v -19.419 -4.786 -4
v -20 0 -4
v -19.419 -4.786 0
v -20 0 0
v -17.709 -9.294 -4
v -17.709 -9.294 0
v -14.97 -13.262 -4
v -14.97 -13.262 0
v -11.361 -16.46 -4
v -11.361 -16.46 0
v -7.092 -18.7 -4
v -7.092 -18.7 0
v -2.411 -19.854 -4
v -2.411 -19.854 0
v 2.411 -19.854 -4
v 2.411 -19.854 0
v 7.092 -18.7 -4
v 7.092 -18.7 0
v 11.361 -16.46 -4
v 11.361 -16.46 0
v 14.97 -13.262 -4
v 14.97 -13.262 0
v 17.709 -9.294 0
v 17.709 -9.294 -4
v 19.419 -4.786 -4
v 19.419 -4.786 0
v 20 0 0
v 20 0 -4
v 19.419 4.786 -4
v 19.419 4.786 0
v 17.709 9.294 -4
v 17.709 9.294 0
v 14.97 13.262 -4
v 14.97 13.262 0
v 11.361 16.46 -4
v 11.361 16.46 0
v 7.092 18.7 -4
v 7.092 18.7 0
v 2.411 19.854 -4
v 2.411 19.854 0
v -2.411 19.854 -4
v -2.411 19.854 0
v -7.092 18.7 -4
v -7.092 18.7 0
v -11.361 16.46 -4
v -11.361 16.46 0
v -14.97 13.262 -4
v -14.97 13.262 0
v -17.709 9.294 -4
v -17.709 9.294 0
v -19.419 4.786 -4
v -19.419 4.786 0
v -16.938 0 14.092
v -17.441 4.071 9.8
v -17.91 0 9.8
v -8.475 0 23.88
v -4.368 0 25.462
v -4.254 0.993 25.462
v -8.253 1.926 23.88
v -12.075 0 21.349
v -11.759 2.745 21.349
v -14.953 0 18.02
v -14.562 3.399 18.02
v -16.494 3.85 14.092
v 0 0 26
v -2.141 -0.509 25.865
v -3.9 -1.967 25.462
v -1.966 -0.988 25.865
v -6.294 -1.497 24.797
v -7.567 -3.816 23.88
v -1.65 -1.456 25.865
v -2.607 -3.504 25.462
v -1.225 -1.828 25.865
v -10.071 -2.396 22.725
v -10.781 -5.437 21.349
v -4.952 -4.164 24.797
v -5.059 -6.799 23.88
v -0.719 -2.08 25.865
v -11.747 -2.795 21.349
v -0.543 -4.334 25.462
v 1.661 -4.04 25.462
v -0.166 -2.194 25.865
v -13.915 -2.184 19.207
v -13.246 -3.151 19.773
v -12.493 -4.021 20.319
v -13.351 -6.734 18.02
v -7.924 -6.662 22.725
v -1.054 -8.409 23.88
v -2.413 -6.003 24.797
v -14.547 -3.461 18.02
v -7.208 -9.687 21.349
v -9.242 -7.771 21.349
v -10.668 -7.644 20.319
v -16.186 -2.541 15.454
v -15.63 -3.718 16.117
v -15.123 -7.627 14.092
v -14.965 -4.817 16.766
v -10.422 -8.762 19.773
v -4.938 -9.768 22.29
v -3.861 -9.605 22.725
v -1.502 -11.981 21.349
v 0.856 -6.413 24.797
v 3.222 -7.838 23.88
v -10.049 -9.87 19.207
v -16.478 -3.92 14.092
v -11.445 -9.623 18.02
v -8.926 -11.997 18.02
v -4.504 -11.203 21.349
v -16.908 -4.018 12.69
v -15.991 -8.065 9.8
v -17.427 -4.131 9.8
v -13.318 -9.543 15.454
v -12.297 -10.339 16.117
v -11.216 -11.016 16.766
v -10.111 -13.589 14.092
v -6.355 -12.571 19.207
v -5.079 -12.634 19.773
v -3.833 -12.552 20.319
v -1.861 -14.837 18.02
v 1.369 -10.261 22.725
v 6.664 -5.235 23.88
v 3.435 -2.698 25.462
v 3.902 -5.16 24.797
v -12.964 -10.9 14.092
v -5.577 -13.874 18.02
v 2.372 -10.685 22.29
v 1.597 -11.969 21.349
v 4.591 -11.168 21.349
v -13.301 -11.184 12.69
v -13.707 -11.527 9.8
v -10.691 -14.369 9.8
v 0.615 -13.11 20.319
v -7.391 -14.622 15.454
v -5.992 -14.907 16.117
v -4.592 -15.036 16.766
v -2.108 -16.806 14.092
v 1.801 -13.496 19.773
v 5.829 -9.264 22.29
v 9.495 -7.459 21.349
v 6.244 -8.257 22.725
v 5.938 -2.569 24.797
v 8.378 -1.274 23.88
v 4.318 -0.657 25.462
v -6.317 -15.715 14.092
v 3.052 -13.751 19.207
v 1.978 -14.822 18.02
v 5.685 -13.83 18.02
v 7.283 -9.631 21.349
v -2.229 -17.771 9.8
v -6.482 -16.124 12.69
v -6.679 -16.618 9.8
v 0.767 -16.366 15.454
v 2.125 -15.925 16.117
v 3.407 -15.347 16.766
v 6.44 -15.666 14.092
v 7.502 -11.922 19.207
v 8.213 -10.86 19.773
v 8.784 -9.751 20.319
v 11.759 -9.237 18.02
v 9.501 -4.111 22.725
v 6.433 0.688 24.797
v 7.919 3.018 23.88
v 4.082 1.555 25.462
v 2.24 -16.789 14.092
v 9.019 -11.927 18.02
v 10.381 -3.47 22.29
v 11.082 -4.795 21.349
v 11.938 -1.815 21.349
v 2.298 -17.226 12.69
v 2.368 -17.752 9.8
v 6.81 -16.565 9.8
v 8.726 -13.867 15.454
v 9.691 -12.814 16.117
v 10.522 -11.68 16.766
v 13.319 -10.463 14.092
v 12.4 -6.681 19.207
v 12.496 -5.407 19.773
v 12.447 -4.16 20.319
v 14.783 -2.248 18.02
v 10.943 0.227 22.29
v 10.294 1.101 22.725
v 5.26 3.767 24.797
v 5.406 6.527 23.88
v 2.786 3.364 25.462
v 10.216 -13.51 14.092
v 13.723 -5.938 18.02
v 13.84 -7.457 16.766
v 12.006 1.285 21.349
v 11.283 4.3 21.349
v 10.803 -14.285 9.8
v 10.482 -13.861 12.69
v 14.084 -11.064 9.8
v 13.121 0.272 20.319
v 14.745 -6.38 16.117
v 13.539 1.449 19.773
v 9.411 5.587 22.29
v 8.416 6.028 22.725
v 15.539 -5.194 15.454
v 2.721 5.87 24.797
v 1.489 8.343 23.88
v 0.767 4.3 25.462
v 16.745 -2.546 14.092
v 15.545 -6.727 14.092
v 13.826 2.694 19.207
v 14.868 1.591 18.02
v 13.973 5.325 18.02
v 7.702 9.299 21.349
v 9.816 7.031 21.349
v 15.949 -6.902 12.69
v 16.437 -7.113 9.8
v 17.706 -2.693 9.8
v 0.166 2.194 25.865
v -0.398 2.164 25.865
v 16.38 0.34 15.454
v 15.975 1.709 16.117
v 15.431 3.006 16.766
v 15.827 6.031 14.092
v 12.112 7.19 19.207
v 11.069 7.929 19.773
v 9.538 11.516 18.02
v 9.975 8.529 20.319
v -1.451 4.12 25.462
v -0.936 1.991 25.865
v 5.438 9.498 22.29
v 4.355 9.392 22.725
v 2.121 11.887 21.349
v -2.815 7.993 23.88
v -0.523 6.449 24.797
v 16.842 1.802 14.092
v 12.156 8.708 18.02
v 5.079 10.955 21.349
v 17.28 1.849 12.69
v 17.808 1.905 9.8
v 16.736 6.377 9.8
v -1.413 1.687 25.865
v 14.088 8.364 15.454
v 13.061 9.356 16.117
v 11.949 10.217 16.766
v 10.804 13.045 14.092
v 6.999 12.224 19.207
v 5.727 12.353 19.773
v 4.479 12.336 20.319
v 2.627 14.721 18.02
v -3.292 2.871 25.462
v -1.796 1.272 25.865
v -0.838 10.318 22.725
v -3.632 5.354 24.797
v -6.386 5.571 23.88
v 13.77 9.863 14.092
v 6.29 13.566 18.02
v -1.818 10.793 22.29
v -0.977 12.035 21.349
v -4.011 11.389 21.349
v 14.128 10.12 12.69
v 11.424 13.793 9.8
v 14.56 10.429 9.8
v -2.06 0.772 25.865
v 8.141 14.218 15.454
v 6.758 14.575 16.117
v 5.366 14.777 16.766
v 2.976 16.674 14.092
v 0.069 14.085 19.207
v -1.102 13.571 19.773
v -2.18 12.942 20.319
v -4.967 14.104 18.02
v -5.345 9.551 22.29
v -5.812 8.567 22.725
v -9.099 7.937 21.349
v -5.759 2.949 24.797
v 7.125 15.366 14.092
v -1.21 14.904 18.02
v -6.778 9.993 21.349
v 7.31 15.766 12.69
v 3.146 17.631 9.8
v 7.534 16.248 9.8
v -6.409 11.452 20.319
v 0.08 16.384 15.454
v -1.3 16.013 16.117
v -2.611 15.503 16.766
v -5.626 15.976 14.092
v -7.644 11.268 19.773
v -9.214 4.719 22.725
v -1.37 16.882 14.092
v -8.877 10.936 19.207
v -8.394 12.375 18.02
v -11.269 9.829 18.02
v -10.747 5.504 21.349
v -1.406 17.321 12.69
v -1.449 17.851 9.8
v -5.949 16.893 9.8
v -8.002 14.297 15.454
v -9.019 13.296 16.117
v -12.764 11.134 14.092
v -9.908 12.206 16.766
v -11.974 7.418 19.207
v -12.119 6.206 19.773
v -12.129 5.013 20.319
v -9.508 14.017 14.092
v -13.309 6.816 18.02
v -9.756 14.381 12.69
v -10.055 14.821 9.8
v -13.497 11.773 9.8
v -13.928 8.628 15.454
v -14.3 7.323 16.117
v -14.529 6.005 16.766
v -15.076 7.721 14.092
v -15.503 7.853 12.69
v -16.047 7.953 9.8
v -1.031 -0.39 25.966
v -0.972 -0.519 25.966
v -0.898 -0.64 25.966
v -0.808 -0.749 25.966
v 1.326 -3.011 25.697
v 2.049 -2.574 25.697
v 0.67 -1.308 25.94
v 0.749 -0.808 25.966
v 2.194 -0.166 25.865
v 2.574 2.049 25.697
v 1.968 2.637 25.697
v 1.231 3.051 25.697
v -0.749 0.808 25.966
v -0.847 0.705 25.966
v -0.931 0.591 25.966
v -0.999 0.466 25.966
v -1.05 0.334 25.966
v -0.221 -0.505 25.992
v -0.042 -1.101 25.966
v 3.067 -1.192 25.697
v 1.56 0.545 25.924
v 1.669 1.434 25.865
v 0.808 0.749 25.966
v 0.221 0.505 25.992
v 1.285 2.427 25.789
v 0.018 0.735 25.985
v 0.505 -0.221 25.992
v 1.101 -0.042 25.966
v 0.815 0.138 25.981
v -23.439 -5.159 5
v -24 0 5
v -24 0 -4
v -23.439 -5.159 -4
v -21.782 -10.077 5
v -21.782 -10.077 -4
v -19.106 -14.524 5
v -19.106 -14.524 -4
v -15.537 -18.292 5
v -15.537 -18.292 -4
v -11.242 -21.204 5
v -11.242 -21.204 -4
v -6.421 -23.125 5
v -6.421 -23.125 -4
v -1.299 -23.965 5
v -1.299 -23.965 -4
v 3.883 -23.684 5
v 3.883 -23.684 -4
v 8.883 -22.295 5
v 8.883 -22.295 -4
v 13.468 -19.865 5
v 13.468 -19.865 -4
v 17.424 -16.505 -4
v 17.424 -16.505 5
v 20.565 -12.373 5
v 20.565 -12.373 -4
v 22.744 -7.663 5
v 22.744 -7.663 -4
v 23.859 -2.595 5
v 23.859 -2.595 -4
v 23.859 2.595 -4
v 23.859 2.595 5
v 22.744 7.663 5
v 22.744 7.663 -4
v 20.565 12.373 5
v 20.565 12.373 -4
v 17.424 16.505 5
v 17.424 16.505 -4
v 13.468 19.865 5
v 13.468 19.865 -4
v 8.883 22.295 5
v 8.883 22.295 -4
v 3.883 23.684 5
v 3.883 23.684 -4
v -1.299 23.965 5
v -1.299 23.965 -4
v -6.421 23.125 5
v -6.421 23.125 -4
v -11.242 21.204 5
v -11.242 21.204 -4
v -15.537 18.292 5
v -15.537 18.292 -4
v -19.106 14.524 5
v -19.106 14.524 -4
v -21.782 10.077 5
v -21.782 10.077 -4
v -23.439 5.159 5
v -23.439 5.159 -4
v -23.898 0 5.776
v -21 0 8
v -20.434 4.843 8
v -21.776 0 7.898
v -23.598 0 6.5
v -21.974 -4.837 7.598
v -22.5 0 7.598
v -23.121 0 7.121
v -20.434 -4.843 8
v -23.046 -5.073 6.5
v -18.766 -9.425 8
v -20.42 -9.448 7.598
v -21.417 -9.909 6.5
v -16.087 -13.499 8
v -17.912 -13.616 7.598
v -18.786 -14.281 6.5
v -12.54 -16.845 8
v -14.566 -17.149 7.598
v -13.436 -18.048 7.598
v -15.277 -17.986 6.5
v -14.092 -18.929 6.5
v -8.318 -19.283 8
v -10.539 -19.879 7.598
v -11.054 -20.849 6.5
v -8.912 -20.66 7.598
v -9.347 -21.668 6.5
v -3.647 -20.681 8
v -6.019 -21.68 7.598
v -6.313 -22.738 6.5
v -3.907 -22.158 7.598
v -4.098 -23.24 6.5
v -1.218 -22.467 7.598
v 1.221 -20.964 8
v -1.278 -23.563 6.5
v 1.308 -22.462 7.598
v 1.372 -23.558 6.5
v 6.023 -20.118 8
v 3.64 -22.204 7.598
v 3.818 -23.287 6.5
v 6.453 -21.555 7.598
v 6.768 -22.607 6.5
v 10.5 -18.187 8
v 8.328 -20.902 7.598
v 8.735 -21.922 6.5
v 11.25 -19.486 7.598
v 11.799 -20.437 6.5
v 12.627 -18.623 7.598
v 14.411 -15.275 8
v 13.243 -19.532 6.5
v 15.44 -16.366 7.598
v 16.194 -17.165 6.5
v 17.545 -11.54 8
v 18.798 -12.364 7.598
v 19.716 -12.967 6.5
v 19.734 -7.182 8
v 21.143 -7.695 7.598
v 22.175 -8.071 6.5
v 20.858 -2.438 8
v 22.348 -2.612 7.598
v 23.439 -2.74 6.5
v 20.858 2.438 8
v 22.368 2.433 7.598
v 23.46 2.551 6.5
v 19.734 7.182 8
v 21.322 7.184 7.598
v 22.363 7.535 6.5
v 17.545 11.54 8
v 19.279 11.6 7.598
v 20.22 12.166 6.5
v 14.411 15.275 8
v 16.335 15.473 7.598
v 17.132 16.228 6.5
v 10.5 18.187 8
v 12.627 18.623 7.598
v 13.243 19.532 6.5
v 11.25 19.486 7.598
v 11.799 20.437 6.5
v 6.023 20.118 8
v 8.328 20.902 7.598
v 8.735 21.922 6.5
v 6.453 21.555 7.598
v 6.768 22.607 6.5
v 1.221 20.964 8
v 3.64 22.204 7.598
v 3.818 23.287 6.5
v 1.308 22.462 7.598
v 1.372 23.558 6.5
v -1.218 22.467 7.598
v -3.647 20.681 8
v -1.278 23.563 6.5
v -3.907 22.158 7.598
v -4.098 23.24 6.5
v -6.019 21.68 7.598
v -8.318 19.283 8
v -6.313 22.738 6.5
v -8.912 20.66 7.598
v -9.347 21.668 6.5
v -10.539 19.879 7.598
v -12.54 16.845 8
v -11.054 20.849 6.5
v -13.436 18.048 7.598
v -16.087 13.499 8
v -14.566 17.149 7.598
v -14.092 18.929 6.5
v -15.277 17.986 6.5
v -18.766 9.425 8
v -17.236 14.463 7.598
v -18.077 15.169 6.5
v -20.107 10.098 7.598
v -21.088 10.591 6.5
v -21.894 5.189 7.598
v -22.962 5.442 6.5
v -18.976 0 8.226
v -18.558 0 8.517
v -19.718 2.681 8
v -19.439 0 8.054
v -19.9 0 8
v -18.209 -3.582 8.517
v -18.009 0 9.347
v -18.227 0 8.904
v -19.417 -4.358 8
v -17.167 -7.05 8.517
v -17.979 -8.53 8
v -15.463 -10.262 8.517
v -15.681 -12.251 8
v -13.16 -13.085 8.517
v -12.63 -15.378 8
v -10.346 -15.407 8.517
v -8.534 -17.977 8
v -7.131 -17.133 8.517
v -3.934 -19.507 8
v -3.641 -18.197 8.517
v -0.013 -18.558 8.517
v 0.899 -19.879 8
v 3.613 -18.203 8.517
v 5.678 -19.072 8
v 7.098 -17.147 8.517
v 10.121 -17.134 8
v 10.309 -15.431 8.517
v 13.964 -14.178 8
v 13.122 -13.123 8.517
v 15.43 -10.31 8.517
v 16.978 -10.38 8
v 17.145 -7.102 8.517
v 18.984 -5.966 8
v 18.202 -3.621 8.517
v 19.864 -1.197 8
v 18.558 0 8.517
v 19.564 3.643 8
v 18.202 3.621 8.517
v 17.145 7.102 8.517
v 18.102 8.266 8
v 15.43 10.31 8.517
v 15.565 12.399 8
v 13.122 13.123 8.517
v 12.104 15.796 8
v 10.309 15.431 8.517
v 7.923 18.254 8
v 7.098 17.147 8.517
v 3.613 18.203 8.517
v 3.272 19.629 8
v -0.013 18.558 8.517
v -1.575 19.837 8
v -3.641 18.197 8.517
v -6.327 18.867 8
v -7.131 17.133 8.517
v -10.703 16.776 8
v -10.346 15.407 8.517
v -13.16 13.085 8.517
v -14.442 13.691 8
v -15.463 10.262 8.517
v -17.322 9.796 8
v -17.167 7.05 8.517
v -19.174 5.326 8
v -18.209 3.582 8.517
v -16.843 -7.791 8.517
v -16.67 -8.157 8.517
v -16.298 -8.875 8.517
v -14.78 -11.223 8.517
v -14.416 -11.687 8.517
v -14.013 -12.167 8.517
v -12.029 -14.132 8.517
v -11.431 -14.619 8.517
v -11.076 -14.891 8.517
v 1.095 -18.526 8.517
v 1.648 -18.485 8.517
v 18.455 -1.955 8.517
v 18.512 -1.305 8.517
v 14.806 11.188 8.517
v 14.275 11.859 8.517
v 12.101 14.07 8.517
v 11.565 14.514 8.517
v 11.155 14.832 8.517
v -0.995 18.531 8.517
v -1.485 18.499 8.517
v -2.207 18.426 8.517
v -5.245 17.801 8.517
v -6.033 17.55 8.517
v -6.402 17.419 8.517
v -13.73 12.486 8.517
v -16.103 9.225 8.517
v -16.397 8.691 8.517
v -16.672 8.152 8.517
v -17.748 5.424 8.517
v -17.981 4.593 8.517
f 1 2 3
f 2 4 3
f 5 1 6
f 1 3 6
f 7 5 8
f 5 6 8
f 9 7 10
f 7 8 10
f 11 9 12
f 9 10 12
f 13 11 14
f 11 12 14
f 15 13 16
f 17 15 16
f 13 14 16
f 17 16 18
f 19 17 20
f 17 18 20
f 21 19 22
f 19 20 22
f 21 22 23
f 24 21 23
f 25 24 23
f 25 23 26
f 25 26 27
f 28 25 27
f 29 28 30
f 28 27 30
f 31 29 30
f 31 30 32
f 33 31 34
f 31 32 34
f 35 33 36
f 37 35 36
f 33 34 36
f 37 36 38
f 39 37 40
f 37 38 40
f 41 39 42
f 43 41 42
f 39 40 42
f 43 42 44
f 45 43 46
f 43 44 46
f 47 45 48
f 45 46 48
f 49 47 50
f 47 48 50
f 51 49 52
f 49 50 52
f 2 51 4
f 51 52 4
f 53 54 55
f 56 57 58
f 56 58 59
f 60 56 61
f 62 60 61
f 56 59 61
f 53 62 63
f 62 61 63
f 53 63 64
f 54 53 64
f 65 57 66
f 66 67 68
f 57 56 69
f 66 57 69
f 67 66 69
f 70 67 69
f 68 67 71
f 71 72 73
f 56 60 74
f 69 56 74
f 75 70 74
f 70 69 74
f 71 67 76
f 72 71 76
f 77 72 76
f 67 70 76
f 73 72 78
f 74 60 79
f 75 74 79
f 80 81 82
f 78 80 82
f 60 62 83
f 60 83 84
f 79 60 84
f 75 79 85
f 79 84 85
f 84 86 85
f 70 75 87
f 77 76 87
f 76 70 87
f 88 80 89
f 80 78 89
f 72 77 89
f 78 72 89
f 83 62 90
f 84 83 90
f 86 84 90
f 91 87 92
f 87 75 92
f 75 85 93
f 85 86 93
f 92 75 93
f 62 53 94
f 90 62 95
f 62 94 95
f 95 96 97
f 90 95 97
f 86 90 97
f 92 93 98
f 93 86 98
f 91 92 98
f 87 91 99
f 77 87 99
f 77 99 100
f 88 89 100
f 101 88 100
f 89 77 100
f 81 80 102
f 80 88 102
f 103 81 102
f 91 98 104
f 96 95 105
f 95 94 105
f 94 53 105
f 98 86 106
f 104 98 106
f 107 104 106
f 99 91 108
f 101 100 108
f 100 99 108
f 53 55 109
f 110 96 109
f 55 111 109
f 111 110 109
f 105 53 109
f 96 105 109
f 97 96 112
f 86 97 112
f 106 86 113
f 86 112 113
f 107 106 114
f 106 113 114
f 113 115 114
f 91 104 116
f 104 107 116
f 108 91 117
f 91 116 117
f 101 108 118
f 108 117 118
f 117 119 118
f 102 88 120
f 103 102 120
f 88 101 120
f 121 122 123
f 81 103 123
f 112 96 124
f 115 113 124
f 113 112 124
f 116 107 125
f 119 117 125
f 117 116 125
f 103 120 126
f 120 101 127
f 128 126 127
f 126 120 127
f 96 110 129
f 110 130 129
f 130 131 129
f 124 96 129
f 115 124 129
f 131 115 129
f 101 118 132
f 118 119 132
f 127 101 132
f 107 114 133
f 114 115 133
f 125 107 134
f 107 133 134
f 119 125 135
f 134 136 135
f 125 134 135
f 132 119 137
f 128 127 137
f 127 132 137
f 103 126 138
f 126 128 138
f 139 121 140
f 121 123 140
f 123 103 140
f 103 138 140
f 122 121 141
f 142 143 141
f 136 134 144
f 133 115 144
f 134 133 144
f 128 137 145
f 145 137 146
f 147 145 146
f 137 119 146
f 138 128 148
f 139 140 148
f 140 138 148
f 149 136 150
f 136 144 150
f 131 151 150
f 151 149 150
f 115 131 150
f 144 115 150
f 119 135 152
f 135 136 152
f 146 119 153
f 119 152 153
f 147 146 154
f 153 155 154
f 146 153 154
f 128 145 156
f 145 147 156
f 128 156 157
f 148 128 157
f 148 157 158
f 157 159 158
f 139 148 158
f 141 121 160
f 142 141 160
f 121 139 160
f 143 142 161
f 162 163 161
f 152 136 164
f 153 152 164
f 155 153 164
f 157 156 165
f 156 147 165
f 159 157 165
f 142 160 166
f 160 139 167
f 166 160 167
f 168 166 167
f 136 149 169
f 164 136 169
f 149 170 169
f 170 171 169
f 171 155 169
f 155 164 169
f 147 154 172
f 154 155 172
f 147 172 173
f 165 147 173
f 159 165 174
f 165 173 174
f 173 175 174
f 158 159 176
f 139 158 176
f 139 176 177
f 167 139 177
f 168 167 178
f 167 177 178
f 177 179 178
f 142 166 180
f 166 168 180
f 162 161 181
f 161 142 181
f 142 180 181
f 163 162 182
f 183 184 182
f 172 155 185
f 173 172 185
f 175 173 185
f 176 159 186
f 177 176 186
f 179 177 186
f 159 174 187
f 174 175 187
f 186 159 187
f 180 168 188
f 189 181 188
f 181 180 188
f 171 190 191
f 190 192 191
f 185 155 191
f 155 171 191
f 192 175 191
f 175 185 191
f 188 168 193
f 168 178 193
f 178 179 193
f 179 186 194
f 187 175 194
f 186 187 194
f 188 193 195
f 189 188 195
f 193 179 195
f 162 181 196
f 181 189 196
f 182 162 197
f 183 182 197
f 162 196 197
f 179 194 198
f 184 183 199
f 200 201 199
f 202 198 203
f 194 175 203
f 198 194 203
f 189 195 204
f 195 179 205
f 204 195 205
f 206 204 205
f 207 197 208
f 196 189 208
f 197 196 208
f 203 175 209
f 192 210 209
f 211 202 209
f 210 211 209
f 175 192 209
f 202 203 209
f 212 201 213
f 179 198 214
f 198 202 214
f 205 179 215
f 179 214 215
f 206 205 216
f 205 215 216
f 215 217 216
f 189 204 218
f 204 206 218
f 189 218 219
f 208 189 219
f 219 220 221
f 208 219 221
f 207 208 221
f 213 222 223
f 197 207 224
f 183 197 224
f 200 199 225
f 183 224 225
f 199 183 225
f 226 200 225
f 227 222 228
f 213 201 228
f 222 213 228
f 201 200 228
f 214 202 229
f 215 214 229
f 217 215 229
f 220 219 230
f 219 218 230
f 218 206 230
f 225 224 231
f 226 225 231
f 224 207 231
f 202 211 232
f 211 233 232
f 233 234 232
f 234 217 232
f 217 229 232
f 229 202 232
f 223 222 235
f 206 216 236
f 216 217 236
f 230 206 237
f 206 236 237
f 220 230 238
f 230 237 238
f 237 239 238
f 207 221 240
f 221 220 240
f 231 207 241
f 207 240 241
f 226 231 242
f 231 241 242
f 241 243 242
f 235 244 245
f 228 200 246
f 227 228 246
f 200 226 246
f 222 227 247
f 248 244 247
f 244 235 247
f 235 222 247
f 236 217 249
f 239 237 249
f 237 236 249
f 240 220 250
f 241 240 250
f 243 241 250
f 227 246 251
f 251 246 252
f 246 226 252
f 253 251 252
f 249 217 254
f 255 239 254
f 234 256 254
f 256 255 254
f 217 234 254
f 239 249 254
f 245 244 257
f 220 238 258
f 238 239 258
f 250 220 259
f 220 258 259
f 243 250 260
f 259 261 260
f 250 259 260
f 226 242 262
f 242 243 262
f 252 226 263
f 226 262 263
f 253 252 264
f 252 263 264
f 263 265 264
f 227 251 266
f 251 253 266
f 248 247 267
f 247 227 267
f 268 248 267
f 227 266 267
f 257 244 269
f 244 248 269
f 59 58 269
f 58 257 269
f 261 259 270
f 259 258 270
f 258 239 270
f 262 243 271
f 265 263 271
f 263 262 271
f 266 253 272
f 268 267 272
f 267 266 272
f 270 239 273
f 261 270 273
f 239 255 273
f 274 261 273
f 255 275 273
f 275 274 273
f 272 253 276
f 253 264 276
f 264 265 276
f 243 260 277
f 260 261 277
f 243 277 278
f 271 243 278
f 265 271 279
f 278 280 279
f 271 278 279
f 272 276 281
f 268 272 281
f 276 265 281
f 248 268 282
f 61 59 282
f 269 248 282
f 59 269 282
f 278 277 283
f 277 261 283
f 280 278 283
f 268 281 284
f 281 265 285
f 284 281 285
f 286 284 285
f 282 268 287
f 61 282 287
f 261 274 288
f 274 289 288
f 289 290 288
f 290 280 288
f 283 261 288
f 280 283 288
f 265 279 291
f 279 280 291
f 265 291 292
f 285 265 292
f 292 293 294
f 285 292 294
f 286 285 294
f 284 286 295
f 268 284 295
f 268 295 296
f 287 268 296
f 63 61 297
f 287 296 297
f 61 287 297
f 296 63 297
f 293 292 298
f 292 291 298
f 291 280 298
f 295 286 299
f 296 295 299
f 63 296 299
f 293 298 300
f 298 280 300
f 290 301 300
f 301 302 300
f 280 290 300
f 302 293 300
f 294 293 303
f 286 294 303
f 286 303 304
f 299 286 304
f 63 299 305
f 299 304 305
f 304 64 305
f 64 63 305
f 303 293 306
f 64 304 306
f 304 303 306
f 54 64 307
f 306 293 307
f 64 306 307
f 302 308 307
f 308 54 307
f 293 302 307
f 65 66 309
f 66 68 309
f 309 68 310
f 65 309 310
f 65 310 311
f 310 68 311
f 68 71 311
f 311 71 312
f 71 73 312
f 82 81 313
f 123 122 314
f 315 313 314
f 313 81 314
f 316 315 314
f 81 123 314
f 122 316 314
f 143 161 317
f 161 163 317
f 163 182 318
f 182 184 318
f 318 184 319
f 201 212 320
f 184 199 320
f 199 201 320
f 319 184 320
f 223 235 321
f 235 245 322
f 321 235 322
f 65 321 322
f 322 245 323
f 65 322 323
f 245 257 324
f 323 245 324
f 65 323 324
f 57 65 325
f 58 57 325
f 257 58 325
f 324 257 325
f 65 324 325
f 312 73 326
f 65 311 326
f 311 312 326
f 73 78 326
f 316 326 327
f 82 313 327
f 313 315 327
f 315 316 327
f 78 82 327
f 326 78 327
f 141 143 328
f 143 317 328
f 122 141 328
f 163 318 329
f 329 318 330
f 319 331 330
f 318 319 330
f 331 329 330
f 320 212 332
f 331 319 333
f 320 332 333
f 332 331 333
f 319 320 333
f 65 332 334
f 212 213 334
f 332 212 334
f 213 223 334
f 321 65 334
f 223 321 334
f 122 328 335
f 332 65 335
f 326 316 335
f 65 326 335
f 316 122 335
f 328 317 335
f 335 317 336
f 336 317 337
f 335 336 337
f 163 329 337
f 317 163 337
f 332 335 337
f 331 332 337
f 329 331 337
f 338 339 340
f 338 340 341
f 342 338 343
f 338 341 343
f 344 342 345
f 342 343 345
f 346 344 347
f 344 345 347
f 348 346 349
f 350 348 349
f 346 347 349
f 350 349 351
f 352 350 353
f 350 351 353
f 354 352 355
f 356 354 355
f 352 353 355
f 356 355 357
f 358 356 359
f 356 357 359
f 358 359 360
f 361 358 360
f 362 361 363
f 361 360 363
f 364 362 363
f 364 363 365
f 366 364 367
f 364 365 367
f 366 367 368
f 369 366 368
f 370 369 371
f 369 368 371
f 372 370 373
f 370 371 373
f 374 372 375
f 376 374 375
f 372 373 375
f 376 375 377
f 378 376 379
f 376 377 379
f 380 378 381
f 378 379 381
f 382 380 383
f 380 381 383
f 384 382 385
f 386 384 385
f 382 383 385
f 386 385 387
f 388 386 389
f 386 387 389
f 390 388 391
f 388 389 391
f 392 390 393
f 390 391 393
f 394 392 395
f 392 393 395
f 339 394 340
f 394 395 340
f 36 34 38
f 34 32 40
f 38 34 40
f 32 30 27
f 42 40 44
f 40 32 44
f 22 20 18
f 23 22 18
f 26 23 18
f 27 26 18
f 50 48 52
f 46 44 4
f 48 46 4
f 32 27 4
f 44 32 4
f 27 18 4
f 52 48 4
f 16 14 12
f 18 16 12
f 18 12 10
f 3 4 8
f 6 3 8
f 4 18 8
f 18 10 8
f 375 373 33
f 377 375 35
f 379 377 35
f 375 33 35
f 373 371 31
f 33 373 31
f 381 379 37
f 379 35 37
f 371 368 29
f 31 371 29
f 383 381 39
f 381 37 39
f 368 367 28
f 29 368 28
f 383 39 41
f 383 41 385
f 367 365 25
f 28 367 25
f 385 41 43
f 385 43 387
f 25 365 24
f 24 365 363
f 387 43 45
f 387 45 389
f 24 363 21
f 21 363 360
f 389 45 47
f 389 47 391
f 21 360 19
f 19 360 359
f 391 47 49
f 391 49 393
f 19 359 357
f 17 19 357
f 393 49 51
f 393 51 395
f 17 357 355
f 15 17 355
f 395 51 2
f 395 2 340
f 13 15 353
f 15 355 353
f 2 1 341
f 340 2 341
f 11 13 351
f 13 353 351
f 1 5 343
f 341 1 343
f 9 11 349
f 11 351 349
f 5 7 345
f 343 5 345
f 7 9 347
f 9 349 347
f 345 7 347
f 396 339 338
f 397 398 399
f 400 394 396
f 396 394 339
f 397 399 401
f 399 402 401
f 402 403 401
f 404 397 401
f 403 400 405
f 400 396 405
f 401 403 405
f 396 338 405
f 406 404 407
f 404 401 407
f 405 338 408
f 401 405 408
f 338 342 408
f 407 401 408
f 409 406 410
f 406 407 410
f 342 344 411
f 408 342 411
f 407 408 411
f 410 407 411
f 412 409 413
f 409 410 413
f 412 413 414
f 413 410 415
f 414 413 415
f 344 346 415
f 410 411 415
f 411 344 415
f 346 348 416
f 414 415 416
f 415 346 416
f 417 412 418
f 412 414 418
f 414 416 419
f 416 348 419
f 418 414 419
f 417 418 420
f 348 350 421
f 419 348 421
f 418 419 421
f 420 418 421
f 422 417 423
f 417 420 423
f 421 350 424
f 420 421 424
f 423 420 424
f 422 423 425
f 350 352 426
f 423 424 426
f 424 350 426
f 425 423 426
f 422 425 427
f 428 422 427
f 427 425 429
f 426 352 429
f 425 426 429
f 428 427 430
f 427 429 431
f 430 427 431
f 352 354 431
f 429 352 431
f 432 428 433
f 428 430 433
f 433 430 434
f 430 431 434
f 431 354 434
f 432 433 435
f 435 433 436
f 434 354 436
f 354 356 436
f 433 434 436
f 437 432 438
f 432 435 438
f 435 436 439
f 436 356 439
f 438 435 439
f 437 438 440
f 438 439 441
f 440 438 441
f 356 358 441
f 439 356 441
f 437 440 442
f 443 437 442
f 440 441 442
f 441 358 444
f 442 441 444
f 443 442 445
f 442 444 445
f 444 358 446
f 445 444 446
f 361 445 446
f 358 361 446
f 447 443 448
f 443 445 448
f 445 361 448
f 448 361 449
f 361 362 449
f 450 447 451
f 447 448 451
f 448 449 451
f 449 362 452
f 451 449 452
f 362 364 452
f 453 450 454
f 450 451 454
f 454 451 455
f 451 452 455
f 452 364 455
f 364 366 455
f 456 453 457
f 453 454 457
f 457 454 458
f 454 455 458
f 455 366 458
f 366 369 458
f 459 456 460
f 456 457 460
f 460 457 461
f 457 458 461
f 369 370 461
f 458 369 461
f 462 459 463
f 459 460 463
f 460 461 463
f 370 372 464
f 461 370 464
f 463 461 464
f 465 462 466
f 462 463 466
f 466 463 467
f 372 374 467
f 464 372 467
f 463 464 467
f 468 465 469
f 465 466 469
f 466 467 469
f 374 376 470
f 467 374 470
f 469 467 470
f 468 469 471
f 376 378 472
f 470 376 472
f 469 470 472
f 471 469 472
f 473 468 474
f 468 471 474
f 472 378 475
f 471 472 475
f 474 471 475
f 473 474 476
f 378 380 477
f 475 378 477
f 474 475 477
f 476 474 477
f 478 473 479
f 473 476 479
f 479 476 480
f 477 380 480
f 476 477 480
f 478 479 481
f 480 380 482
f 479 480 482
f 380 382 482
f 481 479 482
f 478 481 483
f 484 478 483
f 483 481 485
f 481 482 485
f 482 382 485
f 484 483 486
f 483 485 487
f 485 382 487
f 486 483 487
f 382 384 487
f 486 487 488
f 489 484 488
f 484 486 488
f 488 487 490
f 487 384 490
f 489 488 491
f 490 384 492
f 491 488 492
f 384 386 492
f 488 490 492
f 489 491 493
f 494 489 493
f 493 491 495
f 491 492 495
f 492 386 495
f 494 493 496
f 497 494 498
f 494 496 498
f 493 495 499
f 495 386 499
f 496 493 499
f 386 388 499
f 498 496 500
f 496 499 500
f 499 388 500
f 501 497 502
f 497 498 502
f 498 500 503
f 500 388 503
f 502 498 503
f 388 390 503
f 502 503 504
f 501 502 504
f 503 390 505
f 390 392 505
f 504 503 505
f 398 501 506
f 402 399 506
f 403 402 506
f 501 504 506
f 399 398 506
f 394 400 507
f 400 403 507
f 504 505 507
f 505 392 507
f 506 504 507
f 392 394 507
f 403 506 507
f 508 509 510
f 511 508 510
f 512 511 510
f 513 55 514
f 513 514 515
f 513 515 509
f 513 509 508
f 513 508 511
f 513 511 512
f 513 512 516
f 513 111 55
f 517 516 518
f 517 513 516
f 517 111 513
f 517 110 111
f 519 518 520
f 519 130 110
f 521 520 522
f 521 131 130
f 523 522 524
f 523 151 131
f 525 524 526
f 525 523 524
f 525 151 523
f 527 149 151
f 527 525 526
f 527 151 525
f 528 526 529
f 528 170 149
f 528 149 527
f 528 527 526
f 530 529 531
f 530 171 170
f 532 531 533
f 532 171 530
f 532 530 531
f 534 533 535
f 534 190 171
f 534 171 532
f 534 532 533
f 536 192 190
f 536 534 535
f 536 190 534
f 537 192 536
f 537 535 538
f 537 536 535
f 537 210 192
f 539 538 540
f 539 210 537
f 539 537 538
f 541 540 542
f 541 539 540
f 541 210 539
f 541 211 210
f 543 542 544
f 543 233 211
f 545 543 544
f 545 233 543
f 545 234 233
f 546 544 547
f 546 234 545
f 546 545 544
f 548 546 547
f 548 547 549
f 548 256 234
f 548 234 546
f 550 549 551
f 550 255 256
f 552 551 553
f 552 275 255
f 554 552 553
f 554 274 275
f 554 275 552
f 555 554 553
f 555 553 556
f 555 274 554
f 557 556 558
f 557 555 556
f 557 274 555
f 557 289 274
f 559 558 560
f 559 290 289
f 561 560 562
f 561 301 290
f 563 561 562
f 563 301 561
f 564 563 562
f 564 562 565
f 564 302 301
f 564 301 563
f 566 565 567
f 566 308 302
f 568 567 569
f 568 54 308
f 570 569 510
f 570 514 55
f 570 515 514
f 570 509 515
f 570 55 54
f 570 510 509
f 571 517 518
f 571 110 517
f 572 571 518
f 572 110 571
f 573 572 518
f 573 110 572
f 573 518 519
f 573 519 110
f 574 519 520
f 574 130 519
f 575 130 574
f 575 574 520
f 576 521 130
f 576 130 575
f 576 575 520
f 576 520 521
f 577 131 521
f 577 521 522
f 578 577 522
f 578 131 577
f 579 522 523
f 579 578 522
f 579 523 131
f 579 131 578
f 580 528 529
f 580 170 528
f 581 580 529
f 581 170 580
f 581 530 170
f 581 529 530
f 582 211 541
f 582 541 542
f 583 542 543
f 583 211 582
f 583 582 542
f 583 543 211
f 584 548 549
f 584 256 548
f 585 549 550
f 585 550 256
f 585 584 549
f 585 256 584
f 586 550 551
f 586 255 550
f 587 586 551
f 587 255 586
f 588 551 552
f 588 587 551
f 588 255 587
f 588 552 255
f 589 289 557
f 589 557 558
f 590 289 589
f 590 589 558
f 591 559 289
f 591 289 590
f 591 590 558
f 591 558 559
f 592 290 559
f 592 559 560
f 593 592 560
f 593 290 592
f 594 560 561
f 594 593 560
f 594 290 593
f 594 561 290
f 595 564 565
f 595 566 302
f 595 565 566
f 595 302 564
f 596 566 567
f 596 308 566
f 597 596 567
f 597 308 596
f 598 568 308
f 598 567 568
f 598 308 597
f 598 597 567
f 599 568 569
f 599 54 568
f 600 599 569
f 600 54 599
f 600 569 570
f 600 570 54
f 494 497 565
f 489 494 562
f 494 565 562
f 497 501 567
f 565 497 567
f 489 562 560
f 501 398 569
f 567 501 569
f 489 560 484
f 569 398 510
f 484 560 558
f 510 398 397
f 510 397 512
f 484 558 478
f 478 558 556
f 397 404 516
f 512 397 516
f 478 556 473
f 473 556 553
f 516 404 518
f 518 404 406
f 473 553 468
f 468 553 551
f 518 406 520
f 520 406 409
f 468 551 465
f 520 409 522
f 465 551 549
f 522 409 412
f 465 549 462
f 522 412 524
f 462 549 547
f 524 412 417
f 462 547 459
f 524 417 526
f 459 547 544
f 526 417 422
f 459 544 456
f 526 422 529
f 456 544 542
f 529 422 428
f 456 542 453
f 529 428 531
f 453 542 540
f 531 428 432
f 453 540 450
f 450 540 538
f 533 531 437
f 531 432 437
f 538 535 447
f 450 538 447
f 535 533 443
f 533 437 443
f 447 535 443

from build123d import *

# Parameters (mm, degrees)
F2_R = 2
F3_R = 3


with BuildPart() as f1:
    # F0 (on Front) → F1 (revolve)
    with BuildSketch(Plane.XZ):
        with BuildLine():
            Line((-20, 0), (0, 0))
            Line((0, 0), (0, 8))
            Line((0, 8), (0, 26))
            ThreePointArc((0, 26), (-12.727922, 20.727922), (-18, 8))
            Line((-18, 8), (-24, 8))
            Line((-24, 8), (-24, -4))
            Line((-24, -4), (-20, -4))
            Line((-20, -4), (-20, 0))
        make_face()
    revolve(axis=Axis((0, 0, 17), (0, 0, 1)))

    # F2
    f2_edges = [f1.edges().sort_by_distance(p)[0] for p in [
        (18, 0, 8),
    ]]
    fillet(f2_edges, radius=F2_R)

    # F3
    f3_edges = [f1.edges().sort_by_distance(p)[0] for p in [
        (24, 0, 8),
    ]]
    fillet(f3_edges, radius=F3_R)


solid = f1.part
